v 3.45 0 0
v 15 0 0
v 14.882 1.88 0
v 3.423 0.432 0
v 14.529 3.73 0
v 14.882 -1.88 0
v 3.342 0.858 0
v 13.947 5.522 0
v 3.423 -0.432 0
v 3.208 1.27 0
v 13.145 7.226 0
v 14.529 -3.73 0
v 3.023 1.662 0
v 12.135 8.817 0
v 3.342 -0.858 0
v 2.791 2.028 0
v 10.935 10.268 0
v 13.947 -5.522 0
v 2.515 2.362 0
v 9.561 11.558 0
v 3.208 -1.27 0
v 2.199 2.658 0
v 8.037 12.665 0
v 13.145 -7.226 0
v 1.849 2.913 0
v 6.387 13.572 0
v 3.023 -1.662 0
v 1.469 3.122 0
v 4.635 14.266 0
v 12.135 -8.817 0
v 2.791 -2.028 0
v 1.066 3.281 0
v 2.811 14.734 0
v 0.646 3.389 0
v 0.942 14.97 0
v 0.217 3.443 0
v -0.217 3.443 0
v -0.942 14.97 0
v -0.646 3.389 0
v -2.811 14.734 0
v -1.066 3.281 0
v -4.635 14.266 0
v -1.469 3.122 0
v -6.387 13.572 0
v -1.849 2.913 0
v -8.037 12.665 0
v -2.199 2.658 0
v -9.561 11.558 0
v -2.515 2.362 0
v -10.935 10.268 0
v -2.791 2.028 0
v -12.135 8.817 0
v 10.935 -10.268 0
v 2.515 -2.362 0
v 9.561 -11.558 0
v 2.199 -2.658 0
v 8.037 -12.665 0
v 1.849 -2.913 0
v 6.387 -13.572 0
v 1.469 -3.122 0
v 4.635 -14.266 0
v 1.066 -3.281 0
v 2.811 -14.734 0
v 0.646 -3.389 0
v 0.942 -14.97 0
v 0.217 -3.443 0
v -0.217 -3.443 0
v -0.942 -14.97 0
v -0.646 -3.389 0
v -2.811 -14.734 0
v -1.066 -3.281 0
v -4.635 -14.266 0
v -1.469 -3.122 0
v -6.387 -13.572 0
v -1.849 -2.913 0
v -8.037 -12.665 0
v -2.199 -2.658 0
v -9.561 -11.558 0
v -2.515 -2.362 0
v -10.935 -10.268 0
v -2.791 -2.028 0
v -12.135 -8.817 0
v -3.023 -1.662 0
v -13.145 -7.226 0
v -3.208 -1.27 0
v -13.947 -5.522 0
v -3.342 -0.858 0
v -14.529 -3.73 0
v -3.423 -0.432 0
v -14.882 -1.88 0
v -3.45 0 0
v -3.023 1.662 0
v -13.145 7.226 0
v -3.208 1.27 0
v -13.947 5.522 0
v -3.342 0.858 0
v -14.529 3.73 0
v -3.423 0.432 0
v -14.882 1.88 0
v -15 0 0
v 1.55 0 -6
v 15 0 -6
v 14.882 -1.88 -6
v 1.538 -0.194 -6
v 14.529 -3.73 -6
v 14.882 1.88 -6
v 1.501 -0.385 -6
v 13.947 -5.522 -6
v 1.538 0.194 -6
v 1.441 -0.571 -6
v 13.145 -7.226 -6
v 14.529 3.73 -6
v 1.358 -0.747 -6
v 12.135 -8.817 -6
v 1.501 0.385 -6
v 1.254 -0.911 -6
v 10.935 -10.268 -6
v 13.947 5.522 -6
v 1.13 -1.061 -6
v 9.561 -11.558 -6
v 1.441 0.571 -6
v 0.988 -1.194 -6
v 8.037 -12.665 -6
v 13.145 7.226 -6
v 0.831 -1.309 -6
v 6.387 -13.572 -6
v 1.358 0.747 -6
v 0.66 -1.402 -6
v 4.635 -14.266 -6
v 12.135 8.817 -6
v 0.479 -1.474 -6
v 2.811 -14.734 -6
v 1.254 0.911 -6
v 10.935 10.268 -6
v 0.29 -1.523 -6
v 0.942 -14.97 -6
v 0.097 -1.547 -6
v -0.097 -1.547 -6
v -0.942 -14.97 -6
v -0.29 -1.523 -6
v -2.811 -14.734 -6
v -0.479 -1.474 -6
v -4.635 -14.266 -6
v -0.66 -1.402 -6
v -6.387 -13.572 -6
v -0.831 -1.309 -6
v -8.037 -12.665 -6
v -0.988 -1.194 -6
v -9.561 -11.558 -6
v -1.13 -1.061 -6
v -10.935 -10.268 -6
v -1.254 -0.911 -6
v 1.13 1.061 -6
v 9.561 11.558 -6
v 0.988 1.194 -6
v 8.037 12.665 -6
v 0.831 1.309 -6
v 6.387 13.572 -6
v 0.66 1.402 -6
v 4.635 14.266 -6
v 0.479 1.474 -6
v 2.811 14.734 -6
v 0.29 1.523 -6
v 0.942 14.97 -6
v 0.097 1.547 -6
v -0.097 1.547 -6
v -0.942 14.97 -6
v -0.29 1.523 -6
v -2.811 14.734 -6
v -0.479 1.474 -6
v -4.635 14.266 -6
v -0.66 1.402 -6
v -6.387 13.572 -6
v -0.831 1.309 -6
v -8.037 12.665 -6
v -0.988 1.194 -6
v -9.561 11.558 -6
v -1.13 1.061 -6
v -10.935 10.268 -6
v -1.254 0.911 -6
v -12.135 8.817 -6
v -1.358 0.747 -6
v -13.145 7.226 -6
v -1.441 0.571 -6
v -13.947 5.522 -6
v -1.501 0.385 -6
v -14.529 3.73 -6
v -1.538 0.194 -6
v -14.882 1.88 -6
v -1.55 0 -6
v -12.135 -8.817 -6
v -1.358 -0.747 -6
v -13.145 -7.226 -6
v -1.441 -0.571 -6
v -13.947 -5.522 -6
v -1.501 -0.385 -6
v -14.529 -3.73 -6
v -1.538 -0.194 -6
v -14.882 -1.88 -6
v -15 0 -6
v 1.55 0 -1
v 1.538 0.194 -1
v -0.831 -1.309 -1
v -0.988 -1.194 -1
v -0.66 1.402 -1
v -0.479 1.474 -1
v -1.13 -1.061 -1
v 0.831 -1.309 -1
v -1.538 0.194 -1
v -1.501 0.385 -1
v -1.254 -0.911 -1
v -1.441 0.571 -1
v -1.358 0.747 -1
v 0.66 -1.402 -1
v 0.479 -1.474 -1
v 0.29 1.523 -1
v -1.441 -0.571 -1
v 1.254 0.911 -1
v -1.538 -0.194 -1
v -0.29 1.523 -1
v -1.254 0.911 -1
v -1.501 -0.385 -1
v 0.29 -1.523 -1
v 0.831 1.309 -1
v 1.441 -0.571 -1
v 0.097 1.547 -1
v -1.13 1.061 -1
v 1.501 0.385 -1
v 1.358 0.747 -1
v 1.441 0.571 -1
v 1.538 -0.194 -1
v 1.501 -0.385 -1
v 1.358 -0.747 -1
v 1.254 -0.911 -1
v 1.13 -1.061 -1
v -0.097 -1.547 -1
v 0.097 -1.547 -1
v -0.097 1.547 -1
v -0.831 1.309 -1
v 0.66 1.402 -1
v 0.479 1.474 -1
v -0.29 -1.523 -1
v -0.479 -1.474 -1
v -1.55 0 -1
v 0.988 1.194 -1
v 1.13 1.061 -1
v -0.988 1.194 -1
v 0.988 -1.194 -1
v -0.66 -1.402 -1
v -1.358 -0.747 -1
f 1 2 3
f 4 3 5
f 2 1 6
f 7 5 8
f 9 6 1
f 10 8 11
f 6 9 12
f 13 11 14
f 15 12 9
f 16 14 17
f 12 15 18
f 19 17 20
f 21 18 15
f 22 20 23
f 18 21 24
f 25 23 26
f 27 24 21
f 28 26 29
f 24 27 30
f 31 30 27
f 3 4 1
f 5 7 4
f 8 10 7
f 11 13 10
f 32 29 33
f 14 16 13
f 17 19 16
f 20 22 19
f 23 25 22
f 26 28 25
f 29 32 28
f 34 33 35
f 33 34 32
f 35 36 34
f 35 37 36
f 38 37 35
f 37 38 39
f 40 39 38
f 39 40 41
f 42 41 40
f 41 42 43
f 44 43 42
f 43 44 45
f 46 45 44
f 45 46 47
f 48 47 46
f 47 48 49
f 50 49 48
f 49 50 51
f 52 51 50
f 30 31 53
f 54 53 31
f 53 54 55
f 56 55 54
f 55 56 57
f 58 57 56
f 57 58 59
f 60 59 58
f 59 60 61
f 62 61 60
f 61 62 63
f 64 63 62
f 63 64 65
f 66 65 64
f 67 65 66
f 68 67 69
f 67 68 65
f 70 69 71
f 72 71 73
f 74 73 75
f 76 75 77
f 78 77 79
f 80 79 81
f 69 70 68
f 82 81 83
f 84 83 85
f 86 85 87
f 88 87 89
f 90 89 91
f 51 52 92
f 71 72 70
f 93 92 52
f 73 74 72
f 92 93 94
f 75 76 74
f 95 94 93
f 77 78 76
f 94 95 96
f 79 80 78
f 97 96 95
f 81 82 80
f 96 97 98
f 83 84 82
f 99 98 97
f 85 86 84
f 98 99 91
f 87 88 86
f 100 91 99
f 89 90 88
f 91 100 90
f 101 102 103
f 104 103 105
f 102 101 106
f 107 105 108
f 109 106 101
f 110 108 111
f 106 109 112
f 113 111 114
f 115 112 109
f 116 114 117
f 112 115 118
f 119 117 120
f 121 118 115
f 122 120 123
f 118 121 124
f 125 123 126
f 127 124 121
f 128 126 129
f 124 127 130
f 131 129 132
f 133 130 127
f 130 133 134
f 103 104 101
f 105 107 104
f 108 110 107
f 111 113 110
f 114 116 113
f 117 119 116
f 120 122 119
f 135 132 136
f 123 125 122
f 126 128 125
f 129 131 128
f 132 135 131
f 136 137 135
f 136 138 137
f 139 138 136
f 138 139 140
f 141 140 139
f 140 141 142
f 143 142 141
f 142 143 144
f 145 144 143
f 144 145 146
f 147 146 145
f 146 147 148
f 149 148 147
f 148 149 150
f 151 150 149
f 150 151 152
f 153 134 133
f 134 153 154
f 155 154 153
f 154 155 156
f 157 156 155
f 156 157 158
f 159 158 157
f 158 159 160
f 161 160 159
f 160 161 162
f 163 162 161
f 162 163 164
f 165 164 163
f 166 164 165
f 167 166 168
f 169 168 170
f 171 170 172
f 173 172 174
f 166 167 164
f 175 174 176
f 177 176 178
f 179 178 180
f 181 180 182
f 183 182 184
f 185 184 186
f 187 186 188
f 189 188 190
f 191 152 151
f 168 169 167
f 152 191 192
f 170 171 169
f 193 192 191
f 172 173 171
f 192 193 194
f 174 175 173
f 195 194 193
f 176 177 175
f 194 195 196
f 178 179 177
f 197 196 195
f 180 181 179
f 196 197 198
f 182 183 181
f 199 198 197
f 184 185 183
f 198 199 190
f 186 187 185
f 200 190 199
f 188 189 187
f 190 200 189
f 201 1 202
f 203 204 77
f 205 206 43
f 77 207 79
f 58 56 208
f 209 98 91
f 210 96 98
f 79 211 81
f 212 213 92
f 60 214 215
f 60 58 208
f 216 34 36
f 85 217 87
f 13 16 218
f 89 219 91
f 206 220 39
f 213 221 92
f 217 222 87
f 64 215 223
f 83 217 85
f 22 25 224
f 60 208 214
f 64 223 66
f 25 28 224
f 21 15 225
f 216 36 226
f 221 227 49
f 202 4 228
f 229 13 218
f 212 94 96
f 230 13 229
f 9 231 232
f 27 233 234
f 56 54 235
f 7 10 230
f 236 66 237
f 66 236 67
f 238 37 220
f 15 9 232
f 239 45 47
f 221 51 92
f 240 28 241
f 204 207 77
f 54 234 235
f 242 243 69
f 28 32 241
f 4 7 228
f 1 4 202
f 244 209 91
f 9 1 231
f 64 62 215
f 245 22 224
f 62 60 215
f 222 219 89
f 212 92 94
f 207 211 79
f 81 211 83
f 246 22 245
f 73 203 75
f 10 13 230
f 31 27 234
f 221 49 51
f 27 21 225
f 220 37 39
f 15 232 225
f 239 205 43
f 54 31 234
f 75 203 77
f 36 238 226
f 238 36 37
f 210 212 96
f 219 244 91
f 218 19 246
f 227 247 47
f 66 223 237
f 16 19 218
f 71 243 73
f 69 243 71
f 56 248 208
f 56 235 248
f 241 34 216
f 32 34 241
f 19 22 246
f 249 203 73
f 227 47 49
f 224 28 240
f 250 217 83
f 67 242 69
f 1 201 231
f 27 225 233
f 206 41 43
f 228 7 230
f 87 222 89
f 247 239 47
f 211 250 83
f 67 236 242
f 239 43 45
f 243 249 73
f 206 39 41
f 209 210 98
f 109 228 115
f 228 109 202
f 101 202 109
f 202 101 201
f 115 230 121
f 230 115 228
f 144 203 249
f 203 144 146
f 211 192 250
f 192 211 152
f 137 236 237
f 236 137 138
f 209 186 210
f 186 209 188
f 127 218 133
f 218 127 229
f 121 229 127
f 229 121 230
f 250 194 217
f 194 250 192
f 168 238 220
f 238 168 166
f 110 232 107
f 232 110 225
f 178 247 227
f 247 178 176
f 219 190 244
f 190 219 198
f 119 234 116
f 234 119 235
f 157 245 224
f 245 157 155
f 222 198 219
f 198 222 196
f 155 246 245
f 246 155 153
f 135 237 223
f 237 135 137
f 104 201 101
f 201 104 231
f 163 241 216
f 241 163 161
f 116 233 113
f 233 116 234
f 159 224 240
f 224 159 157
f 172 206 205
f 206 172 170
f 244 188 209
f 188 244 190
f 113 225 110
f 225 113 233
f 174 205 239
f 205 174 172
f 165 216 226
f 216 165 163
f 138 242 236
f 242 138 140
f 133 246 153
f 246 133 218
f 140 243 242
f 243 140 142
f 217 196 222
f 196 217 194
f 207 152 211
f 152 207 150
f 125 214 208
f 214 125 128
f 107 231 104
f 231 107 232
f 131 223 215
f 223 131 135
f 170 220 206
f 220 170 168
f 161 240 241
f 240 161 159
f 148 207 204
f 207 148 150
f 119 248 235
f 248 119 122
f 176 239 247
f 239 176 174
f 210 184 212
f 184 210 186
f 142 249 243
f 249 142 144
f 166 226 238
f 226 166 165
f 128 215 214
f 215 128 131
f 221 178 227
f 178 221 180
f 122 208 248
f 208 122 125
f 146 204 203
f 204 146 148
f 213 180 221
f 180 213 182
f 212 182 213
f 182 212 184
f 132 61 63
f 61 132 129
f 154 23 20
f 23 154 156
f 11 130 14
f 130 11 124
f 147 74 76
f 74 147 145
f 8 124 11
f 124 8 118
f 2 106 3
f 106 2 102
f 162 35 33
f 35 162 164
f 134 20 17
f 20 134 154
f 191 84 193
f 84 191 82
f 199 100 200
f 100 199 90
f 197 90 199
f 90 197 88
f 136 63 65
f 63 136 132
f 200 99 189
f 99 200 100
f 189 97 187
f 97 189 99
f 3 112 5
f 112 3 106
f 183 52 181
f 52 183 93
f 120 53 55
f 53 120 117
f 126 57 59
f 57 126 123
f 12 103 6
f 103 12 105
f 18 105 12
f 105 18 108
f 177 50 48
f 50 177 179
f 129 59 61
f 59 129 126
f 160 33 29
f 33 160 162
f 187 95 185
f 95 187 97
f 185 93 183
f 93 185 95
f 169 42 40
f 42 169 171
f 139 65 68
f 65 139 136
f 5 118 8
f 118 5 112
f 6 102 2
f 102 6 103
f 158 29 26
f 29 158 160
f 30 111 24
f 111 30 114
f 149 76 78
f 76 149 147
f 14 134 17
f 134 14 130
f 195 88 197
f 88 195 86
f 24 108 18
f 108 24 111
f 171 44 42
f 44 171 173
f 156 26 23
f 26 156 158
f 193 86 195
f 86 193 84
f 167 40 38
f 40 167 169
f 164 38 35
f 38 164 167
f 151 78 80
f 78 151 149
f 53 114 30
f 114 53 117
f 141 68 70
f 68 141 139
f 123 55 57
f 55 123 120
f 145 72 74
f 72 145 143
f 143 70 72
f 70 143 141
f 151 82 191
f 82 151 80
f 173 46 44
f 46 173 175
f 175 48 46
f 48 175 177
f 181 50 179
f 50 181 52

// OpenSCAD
$fn = 50;


difference() {
	union() {
		translate(v = [0, 0, -6.0000000000]) {
			cylinder(h = 6, r = 15.0000000000);
		}
	}
	union() {
		translate(v = [0, 0, 0]) {
			rotate(a = [0, 0, 0]) {
				difference() {
					union() {
						translate(v = [0, 0, -6.0000000000]) {
							cylinder(h = 6, r = 1.2500000000);
						}
						translate(v = [0, 0, -1.0000000000]) {
							cylinder(h = 1.0000000000, r1 = 1.5500000000, r2 = 3.4500000000);
						}
						translate(v = [0, 0, -6.0000000000]) {
							cylinder(h = 6, r = 1.5500000000);
						}
						translate(v = [0, 0, -6.0000000000]) {
							cylinder(h = 6, r = 1.2500000000);
						}
					}
					union();
				}
			}
		}
	}
}
